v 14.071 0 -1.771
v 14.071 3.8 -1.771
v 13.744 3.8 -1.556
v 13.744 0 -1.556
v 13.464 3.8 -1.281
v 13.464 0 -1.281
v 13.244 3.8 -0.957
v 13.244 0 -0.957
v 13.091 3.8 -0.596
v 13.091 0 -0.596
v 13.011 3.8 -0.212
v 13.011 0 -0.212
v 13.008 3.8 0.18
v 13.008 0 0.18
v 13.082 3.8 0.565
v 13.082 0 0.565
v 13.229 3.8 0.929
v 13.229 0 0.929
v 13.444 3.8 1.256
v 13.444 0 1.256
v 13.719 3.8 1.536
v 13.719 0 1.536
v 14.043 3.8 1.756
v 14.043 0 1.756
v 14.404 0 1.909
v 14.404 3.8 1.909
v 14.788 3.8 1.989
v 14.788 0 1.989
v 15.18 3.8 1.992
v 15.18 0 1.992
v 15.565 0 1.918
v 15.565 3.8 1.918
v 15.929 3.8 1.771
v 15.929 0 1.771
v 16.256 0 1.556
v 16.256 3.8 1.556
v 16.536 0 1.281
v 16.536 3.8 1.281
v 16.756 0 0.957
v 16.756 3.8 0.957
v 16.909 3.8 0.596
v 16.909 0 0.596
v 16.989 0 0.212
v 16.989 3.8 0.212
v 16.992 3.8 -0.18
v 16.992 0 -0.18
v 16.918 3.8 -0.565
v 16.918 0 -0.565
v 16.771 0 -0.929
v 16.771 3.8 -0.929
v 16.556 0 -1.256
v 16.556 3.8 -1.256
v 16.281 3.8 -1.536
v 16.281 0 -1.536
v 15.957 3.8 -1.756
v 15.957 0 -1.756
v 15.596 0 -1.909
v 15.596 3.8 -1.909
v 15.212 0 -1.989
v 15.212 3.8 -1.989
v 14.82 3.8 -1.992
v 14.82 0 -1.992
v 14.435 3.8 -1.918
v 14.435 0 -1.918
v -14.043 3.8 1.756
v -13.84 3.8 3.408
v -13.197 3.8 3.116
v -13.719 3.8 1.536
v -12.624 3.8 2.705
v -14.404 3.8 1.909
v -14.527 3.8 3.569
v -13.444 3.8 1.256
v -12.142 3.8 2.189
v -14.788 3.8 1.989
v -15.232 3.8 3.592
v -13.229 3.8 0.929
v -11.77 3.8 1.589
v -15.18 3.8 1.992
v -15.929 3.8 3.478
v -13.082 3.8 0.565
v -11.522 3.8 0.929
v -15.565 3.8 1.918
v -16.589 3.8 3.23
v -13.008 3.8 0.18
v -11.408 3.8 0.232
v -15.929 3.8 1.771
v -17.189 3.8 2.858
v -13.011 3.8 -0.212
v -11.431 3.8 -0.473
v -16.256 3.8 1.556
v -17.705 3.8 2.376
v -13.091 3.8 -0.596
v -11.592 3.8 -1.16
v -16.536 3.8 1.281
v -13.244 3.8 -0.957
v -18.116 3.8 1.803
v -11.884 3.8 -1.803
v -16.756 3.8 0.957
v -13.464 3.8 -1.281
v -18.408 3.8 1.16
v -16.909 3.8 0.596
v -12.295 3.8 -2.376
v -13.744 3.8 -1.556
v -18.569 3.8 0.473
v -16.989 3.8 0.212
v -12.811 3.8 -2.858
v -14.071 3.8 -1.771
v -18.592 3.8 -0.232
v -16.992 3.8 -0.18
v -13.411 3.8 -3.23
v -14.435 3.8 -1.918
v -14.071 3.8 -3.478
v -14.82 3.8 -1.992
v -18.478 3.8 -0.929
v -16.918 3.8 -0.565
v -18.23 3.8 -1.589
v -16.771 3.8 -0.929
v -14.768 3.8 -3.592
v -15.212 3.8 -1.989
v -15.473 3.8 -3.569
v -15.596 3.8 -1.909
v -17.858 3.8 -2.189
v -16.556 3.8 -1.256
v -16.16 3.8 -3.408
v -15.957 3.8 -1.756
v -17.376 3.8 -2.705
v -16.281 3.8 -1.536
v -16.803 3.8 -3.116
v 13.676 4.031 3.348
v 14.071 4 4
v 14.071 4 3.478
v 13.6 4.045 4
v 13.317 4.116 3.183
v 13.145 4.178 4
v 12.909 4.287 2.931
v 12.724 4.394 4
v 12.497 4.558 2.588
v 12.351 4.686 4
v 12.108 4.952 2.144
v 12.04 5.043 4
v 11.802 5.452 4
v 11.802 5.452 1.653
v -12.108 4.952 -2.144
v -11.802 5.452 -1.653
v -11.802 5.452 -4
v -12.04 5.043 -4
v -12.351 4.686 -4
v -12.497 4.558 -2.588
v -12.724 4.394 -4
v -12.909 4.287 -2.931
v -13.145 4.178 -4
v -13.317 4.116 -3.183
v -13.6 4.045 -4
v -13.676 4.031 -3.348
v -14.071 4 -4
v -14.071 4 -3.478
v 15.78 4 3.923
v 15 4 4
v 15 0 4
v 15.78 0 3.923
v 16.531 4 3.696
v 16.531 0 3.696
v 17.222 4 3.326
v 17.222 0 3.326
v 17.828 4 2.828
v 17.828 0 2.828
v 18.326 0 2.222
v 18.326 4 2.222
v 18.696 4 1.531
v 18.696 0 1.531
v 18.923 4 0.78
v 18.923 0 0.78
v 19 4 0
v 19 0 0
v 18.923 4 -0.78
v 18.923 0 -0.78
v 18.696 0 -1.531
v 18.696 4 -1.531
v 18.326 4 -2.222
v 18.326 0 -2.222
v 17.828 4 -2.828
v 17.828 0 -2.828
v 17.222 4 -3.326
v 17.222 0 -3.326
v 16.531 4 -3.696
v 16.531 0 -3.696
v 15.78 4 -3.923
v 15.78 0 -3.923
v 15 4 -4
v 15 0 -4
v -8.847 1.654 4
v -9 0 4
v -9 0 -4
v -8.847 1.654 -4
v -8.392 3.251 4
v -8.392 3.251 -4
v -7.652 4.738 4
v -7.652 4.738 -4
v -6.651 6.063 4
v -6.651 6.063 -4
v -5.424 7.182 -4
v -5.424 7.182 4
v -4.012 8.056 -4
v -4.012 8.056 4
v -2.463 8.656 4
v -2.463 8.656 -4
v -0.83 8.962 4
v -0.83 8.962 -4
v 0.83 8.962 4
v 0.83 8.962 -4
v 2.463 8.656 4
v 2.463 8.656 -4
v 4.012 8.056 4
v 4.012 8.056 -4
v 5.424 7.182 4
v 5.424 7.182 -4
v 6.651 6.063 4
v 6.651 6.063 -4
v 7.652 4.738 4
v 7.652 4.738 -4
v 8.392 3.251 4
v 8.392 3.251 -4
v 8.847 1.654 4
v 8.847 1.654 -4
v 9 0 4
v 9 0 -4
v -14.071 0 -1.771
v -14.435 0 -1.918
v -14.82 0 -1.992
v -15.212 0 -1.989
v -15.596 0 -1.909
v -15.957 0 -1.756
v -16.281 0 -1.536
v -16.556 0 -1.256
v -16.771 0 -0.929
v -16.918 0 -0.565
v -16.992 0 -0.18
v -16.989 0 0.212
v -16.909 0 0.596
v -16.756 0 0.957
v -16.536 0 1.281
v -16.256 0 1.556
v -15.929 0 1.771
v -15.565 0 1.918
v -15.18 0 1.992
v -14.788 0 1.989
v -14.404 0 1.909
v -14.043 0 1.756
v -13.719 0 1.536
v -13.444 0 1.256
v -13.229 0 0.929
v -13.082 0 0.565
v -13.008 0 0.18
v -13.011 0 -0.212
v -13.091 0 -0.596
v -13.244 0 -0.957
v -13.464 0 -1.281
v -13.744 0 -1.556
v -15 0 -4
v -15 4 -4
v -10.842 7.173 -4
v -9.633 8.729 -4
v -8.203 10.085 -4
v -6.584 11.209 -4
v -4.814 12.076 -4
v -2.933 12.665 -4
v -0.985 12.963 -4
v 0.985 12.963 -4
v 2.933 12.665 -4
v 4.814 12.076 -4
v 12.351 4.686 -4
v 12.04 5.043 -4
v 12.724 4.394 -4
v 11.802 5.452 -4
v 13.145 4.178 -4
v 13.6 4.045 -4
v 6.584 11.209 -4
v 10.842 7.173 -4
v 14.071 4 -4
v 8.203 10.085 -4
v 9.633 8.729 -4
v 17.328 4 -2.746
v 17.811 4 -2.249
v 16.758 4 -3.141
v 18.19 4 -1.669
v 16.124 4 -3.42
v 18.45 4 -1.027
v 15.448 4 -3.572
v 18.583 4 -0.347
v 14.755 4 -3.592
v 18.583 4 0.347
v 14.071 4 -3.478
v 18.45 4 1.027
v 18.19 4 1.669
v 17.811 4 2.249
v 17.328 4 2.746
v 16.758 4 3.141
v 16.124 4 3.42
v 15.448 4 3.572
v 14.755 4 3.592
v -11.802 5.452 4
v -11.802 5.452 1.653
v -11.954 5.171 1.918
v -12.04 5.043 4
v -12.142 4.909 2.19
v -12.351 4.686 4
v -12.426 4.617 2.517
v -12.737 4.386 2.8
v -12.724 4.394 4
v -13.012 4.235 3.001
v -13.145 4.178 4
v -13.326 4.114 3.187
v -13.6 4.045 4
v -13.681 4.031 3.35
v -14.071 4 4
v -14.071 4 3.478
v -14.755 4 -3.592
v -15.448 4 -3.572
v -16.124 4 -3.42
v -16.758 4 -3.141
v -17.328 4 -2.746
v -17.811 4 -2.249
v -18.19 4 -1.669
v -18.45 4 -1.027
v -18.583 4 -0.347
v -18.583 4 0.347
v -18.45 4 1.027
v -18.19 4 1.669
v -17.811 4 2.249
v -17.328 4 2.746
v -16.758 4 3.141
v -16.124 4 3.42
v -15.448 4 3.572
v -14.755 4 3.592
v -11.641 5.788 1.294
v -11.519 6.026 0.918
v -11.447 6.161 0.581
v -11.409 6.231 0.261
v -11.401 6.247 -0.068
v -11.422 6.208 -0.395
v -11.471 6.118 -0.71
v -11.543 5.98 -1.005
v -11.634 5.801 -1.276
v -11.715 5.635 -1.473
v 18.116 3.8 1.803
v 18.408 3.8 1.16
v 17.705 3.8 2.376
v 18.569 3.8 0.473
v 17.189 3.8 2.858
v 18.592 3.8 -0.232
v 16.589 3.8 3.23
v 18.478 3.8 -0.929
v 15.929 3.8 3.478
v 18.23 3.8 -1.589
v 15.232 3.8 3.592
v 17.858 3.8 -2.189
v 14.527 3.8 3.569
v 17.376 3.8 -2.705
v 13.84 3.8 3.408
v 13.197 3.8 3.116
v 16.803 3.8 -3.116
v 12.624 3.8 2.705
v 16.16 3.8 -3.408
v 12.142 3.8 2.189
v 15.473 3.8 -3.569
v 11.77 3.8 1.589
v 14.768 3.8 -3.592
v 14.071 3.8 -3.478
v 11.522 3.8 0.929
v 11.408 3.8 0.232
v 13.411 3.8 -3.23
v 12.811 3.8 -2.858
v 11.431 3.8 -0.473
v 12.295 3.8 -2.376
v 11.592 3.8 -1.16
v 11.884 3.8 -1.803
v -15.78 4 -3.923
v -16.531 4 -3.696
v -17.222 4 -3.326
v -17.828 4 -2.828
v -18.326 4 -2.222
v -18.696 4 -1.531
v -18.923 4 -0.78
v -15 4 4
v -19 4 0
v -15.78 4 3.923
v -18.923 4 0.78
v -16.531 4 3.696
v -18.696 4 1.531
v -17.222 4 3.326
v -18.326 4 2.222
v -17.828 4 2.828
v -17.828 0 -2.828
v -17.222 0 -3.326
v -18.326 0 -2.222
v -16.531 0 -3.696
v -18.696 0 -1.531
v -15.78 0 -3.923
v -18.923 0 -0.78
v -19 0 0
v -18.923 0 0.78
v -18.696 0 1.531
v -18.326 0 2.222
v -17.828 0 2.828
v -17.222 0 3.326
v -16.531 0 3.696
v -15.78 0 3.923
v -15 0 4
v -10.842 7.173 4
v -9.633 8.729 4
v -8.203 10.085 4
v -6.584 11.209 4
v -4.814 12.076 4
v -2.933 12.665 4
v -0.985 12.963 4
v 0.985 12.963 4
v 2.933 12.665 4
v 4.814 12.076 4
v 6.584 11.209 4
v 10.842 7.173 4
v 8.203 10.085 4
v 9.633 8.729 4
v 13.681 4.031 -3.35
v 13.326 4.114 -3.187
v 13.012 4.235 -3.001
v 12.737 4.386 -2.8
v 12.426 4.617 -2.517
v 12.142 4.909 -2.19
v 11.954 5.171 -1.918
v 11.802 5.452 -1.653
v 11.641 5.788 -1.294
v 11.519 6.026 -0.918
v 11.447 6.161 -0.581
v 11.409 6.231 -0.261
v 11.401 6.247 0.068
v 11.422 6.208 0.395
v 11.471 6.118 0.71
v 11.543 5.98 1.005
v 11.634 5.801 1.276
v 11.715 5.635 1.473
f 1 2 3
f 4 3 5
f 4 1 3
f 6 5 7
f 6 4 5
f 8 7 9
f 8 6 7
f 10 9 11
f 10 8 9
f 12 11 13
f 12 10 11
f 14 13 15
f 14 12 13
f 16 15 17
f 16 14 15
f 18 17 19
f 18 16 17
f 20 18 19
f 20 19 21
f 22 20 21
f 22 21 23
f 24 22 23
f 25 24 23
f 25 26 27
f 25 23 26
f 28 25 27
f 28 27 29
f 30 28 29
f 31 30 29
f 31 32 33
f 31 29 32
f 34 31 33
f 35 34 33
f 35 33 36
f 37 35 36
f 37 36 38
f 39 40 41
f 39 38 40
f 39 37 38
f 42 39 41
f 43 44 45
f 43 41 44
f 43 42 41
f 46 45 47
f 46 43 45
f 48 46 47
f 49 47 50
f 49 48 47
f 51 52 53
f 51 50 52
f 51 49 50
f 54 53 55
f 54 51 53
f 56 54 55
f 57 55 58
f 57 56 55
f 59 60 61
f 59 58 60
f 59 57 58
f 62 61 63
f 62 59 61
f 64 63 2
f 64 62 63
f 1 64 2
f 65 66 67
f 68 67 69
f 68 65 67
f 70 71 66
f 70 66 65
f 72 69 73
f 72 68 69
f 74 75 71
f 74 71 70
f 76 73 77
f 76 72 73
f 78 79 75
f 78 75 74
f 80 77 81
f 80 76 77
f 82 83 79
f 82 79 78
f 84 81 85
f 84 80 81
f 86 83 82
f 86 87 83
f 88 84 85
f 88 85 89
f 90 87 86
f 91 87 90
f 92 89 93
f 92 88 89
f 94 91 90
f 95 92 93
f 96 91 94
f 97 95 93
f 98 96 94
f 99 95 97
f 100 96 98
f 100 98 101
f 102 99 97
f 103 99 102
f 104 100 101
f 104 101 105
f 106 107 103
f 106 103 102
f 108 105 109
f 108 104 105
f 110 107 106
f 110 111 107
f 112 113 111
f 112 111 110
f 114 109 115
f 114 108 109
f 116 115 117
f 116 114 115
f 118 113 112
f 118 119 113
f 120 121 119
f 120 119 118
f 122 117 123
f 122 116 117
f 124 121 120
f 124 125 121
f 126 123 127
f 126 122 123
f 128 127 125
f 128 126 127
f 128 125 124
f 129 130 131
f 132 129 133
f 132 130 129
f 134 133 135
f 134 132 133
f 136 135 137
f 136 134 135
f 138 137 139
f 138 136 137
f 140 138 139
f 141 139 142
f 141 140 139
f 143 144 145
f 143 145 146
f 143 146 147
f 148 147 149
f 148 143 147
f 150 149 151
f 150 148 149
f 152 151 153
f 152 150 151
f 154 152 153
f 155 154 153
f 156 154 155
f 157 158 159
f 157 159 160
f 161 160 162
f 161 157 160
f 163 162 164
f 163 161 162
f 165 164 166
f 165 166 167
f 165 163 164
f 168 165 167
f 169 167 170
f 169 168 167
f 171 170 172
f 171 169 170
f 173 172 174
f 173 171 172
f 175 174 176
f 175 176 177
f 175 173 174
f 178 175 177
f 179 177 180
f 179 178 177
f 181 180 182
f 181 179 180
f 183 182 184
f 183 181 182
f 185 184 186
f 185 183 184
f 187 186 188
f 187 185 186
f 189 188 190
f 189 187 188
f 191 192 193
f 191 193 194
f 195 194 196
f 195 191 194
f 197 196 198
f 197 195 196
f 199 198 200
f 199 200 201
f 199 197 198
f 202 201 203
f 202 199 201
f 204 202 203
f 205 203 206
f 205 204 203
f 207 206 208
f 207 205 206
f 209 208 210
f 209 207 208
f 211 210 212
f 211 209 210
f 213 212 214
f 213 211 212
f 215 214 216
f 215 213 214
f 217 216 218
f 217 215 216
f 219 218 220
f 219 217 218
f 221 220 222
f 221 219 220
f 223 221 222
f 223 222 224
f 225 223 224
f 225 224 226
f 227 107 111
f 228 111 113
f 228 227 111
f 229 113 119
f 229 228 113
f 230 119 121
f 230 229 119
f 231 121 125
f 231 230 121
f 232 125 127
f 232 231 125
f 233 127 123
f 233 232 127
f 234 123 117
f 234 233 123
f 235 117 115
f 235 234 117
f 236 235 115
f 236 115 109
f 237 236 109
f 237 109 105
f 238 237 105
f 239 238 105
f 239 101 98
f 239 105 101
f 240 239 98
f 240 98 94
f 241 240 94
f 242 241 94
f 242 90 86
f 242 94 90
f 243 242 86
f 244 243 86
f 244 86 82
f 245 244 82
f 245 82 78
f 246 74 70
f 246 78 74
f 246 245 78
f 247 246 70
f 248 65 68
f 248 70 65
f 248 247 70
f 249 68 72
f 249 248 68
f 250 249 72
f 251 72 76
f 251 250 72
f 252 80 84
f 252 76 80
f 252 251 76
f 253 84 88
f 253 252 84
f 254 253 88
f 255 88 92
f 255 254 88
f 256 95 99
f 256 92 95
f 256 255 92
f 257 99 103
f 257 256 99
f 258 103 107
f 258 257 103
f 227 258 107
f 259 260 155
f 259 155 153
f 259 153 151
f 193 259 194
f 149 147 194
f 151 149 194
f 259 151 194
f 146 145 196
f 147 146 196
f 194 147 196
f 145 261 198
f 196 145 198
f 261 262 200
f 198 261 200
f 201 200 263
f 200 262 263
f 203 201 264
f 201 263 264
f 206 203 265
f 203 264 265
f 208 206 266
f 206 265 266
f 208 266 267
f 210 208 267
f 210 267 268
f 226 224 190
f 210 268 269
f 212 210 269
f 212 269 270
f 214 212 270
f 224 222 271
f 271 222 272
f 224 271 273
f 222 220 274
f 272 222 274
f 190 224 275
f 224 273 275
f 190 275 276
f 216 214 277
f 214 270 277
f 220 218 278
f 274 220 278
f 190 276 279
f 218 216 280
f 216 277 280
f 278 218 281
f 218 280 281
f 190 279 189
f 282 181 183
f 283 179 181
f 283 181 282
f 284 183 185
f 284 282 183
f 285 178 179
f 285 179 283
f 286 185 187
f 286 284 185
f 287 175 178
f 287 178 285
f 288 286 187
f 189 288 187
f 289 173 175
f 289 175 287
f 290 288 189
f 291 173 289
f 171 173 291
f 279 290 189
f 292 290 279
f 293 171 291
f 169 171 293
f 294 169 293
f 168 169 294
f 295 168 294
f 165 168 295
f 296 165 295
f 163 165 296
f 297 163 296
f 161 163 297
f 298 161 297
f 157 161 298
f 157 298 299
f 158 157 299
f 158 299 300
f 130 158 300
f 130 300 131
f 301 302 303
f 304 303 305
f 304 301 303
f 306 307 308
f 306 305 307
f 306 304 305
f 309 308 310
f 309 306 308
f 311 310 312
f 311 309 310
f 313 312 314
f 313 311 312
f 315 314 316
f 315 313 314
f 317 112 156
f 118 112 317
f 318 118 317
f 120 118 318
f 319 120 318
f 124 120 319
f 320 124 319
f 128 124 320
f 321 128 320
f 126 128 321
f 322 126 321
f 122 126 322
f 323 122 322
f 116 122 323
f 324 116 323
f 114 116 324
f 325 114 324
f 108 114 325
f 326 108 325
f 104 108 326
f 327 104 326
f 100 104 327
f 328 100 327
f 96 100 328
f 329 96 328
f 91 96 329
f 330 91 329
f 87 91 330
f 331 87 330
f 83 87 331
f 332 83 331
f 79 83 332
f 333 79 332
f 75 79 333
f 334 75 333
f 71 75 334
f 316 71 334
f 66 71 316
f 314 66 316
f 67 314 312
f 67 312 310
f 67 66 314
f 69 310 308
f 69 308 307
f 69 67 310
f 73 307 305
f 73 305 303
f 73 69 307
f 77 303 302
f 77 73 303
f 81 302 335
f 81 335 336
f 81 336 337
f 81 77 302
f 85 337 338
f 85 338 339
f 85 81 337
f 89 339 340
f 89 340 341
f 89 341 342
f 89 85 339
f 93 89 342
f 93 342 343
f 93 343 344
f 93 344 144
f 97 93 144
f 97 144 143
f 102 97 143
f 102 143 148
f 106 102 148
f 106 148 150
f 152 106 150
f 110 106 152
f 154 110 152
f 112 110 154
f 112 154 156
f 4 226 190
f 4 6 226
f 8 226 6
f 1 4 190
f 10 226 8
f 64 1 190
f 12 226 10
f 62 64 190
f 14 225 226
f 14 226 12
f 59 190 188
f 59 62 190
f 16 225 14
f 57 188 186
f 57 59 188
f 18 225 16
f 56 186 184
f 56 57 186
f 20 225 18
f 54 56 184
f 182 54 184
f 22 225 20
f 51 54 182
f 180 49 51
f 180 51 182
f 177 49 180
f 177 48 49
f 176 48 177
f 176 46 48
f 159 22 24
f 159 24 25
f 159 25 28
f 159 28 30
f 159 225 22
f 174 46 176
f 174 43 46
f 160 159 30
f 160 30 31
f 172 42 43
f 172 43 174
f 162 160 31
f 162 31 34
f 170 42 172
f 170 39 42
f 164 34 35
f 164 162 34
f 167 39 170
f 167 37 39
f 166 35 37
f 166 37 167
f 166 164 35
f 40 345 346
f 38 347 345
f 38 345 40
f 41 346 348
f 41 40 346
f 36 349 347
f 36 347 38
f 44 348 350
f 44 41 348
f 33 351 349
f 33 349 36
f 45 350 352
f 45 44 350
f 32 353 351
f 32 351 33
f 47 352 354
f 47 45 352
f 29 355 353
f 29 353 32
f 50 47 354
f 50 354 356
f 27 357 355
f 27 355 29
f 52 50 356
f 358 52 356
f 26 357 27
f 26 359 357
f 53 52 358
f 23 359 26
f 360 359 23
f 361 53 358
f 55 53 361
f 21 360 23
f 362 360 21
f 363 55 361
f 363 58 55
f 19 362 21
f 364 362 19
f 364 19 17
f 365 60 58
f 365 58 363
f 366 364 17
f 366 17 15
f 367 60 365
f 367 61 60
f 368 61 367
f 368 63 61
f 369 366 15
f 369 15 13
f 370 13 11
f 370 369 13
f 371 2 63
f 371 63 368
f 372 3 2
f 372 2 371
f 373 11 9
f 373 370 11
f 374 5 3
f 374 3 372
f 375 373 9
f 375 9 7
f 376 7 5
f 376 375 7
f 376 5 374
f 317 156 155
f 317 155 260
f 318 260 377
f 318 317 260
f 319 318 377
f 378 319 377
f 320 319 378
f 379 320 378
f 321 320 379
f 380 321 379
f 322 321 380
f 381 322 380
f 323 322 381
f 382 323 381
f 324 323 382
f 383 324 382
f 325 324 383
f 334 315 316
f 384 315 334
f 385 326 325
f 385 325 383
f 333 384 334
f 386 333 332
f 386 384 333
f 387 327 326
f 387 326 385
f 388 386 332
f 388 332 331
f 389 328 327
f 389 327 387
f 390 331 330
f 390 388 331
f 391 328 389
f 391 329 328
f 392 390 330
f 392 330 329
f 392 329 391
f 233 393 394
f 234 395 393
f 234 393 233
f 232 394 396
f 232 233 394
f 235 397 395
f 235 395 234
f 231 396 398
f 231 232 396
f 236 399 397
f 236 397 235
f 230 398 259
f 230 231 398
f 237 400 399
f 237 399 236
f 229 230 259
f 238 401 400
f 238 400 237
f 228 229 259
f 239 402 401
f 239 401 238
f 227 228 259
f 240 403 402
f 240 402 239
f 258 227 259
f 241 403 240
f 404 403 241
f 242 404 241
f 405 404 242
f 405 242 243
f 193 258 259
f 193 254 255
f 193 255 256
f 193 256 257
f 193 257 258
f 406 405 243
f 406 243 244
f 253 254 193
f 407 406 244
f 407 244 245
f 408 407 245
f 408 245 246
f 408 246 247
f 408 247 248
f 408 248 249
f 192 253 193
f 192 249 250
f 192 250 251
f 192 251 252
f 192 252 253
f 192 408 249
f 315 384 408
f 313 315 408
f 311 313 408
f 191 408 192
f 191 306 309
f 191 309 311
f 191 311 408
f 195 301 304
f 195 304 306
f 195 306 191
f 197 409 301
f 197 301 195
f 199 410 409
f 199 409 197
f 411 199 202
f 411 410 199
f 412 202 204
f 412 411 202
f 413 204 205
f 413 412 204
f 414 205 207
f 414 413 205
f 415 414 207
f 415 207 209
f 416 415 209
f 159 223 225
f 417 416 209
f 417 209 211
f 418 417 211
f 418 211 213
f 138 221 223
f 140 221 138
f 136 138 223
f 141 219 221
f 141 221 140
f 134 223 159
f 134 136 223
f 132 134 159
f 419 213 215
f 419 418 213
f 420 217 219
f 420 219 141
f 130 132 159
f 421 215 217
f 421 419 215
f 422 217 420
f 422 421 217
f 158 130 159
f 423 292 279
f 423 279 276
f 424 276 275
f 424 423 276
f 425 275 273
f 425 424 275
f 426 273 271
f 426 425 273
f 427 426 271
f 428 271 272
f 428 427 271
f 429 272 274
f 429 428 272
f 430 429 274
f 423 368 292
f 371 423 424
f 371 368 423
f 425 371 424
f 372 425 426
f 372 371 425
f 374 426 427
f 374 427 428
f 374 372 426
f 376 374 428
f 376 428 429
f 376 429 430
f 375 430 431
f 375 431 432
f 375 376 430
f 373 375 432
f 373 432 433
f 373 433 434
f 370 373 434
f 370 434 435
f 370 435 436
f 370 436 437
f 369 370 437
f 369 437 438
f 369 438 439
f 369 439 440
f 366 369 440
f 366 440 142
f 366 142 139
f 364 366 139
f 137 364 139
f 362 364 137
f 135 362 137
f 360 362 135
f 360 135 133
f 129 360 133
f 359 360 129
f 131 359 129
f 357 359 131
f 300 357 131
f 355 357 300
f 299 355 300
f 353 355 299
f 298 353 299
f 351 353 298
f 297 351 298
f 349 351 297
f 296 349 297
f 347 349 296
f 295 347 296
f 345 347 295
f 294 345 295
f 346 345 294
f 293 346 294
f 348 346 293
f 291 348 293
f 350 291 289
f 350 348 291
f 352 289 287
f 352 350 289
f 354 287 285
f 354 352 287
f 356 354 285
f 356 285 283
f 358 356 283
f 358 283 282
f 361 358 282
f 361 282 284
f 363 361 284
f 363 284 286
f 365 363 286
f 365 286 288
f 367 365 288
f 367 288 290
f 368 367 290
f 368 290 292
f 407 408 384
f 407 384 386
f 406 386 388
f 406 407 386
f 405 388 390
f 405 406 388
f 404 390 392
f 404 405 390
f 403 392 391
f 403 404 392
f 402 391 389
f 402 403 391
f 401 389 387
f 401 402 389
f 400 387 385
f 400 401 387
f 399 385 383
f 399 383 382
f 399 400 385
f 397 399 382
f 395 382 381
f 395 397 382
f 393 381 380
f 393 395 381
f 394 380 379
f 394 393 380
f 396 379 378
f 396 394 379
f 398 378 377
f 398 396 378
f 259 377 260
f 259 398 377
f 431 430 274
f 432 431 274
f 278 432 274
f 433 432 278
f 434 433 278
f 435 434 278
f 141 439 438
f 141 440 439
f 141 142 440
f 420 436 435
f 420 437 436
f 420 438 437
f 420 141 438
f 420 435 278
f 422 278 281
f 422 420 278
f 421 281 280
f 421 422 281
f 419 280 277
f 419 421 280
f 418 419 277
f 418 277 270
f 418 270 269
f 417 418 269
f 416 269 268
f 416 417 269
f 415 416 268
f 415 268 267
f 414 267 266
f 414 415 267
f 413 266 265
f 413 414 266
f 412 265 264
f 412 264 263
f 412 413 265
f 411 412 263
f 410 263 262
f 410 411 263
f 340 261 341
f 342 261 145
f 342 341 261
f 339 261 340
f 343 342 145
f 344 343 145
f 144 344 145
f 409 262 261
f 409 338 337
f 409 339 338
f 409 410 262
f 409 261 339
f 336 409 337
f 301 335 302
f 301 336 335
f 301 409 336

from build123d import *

# Parameters (mm, degrees)
BOSS_EXTRUDE1_DEPTH = 4
SKETCH2_R           = 2
CUT_EXTRUDE1_DEPTH  = 24.366642891
FILLET1_RADIUS      = 4
FILLET1_LENGTH      = 4
FILLET2_RADIUS      = 4
FILLET2_LENGTH      = 4
CUT_EXTRUDE2_START  = 3.8
SKETCH3_R           = 3.6
CUT_EXTRUDE2_DEPTH  = 20.566642908


with BuildPart() as part:
    # Sketch1 → Boss-Extrude1 (new, symmetric)
    with BuildSketch(Plane.XY):
        with BuildLine():
            Line((-19, 0), (-9, 0))
            ThreePointArc((-9, 0), (0, 9), (9, 0))
            Line((9, 0), (19, 0))
            Line((19, 0), (19, 4))
            Line((19, 4), (14.071247279, 4))
            ThreePointArc((14.071247279, 4), (12.724207514, 4.393941152), (11.801691267, 5.451612903))
            ThreePointArc((11.801691267, 5.451612903), (0, 13), (-11.801691267, 5.451612903))
            ThreePointArc((-11.801691267, 5.451612903), (-12.724207514, 4.393941152), (-14.071247279, 4))
            Line((-14.071247279, 4), (-19, 4))
            Line((-19, 4), (-19, 0))
        make_face()
    extrude(amount=BOSS_EXTRUDE1_DEPTH, both=True)

    # Sketch2 → Cut-Extrude1 (cut, through all)
    with BuildSketch(Plane(origin=(0, 0, 0), x_dir=(1, 0, 0), z_dir=(0, 1, 0))):
        with Locations(Location((15, 0, 0), (0, 0, 117.669868627))):
            Circle(SKETCH2_R)
        with Locations(Location((-15, 0, 0), (0, 0, 62.330131378))):
            Circle(SKETCH2_R)
    extrude(amount=CUT_EXTRUDE1_DEPTH, mode=Mode.SUBTRACT)

    # Fillet1: full round fillet: the end face becomes a half cylinder, R = half its width
    fillet1_face = Plane((19, 2, 0), x_dir=(0, 1, 0), z_dir=(1, 0, 0))  # on the end face: x along it, z out of the body
    fillet1_slab = fillet1_face.offset(-FILLET1_RADIUS / 2) * Box(FILLET1_LENGTH, 2 * FILLET1_RADIUS, FILLET1_RADIUS, mode=Mode.PRIVATE)  # the body's end, R deep
    fillet1_round = Plane((15, 2, 0), x_dir=(1, 0, 0), z_dir=(0, 1, 0)) * Cylinder(FILLET1_RADIUS, FILLET1_LENGTH, mode=Mode.PRIVATE)  # its axis R under the face
    add(fillet1_slab - fillet1_round, mode=Mode.SUBTRACT)

    # Fillet2: full round fillet: the end face becomes a half cylinder, R = half its width
    fillet2_face = Plane((-19, 2, 0), x_dir=(0, -1, 0), z_dir=(-1, 0, 0))  # on the end face: x along it, z out of the body
    fillet2_slab = fillet2_face.offset(-FILLET2_RADIUS / 2) * Box(FILLET2_LENGTH, 2 * FILLET2_RADIUS, FILLET2_RADIUS, mode=Mode.PRIVATE)  # the body's end, R deep
    fillet2_round = Plane((-15, 2, 0), x_dir=(-1, 0, 0), z_dir=(0, -1, 0)) * Cylinder(FILLET2_RADIUS, FILLET2_LENGTH, mode=Mode.PRIVATE)  # its axis R under the face
    add(fillet2_slab - fillet2_round, mode=Mode.SUBTRACT)

    # Sketch3 → Cut-Extrude2 (cut, through all)
    with BuildSketch(Plane(origin=(0, 0, 0), x_dir=(1, 0, 0), z_dir=(0, 1, 0)).offset(CUT_EXTRUDE2_START)):
        with Locations(Location((-15, 0, 0), (0, 0, 75.049356593))):
            Circle(SKETCH3_R)
        with Locations(Location((15, 0, 0), (0, 0, 104.950643407))):
            Circle(SKETCH3_R)
    extrude(amount=CUT_EXTRUDE2_DEPTH, mode=Mode.SUBTRACT)


solid = part.part
